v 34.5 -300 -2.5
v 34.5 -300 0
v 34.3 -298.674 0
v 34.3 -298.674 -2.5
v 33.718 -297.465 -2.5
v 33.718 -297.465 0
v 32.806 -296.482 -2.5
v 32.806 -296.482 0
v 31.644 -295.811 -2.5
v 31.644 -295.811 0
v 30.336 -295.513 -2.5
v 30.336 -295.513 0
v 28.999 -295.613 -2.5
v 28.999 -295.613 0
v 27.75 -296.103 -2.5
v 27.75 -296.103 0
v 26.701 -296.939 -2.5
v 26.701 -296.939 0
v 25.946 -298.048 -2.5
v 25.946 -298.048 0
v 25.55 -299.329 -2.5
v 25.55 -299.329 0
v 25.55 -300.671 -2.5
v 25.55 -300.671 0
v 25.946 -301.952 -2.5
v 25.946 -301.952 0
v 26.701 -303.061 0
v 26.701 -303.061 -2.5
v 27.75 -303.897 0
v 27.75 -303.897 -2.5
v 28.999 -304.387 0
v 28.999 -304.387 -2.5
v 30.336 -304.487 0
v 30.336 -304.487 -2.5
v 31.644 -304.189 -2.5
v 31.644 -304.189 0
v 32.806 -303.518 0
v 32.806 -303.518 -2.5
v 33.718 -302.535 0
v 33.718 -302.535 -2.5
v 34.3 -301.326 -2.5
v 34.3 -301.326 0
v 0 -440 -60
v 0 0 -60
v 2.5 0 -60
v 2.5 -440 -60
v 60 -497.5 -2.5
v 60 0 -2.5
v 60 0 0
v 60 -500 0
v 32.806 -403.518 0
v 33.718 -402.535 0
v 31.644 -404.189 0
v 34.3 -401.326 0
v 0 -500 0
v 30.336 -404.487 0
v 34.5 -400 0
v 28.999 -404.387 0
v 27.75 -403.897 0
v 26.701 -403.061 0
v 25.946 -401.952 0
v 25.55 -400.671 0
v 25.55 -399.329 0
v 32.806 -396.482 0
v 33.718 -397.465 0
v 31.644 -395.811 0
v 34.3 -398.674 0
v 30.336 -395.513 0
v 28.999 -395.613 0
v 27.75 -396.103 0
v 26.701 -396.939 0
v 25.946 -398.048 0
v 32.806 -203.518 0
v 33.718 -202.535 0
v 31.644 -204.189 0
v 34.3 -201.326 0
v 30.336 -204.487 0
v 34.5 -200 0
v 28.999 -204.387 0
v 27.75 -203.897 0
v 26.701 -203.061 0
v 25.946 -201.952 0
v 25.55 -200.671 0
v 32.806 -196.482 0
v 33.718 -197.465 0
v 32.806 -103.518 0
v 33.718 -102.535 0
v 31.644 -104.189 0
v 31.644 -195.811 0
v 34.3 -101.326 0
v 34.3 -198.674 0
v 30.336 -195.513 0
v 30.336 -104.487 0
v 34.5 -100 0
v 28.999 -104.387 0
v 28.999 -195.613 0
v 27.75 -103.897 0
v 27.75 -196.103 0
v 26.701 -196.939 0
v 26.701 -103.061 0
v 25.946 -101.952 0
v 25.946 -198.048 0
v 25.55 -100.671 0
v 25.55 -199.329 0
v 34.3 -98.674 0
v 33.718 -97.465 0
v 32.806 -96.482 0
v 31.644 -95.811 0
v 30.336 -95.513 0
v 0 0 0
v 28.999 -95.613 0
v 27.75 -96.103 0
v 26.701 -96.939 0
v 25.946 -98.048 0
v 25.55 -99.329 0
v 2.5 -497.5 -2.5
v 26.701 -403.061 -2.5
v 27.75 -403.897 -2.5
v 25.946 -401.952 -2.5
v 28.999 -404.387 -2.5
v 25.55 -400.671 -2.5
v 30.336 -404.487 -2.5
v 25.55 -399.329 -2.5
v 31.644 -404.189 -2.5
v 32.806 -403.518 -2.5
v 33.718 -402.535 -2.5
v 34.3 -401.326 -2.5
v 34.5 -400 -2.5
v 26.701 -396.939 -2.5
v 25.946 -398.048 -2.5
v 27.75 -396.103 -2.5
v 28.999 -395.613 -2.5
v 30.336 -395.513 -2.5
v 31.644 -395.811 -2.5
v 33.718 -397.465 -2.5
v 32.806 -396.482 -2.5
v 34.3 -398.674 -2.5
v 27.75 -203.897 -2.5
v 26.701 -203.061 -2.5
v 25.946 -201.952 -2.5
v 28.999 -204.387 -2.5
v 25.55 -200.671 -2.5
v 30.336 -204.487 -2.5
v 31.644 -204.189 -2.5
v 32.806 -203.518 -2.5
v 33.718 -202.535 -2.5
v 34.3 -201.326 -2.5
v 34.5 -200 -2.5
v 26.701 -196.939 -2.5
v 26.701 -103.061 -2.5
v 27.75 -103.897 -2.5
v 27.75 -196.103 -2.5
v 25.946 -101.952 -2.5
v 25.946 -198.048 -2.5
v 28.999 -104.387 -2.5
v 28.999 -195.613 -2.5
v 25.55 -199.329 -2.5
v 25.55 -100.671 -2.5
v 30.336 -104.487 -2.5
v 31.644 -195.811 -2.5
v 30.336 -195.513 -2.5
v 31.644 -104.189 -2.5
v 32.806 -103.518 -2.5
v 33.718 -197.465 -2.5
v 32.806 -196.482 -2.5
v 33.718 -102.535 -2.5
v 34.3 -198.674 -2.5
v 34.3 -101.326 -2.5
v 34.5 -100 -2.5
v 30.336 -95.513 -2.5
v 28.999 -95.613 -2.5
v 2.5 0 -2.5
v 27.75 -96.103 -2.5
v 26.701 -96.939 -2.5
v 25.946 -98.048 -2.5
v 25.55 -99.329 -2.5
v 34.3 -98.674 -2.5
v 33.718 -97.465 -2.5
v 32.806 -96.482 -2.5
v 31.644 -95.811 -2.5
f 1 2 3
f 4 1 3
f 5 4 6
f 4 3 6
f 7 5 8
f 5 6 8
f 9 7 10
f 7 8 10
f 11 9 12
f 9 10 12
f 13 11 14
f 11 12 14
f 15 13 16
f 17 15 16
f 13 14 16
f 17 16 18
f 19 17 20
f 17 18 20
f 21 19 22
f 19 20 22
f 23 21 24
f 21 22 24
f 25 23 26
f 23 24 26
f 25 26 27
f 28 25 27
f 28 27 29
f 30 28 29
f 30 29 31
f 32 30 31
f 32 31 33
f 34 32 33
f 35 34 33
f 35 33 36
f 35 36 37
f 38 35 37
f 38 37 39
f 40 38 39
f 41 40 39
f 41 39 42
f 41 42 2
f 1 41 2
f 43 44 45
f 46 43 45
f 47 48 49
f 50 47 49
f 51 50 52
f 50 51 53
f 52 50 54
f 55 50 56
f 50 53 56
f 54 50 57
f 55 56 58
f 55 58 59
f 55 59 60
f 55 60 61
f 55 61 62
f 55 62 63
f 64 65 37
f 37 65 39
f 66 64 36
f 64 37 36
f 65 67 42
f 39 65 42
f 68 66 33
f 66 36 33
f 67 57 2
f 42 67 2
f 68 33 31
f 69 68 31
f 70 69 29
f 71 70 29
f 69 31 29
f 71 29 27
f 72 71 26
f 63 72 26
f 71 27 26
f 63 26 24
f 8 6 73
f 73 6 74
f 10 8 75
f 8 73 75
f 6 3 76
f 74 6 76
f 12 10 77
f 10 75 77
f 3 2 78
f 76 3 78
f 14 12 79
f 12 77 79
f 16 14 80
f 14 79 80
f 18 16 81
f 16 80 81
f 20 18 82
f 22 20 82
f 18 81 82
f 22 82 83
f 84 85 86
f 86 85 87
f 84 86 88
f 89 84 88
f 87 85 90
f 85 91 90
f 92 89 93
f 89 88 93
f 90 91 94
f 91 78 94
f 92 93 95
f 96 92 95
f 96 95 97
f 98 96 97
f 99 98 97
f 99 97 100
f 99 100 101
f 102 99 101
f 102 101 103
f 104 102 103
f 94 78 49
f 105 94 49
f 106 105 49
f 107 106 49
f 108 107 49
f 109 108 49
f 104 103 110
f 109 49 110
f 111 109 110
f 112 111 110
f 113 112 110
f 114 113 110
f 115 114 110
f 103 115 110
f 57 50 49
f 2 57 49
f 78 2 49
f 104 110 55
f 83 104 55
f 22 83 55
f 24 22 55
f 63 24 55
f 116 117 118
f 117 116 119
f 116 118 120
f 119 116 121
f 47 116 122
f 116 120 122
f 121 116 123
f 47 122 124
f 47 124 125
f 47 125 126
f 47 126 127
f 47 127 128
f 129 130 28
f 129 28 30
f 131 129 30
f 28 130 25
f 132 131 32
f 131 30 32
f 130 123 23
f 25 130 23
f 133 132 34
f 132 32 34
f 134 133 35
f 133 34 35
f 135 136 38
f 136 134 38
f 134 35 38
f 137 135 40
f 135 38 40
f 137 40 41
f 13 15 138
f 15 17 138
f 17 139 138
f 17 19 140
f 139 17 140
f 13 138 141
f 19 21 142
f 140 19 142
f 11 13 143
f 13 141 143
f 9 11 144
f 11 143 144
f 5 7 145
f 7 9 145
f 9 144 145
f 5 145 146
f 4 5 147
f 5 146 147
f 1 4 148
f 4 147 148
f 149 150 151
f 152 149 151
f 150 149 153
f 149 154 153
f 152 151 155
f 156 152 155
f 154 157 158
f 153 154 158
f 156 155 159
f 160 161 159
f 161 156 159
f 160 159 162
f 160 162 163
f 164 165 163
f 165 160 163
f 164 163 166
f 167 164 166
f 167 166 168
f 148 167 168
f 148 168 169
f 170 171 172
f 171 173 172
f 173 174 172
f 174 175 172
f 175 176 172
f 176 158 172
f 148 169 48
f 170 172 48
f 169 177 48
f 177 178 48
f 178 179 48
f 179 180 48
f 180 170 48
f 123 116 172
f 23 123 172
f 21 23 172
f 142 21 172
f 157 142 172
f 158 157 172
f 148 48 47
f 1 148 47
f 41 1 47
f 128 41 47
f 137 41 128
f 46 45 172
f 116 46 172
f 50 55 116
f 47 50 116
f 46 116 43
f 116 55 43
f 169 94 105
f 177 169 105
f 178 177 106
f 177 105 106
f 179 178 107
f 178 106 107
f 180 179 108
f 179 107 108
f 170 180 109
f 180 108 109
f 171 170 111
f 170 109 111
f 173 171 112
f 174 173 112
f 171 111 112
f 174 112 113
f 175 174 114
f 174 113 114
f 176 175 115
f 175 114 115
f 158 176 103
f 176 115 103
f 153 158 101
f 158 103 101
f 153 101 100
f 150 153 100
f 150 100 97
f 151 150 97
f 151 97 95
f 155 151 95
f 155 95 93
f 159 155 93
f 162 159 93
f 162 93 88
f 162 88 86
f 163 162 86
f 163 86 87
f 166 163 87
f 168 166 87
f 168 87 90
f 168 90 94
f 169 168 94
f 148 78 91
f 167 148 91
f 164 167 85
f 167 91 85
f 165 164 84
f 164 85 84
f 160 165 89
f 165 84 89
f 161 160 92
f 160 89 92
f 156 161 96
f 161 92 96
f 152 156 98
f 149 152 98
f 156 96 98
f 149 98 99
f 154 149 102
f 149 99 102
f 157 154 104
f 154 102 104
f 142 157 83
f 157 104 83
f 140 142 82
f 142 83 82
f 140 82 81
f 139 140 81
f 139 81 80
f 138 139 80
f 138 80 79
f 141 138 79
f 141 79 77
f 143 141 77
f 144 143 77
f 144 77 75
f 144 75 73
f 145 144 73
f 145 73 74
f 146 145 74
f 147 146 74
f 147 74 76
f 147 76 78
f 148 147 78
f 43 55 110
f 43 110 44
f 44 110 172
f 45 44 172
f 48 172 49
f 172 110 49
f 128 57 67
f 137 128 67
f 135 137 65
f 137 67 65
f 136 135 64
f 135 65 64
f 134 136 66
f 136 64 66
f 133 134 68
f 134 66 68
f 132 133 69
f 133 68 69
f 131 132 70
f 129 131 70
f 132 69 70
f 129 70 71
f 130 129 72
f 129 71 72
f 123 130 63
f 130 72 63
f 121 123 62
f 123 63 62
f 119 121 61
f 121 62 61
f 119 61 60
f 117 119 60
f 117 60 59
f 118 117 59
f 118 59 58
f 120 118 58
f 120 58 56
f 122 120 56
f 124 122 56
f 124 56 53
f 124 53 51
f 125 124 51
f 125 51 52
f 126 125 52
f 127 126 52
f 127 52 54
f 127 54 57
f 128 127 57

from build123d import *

# Parameters (mm, degrees)
F1_DEPTH = 500
F3_DEPTH = 60.001
F4_R     = 4.5
F5_DEPTH = 60.001


with BuildPart() as f1:
    # F0 (on Front) → F1 (new body)
    with BuildSketch(Plane.XZ):
        Polygon((60, 0), (0, 0), (0, -60), (2.5, -60), (2.5, -2.5), (60, -2.5), align=None)
    extrude(amount=F1_DEPTH)

    # F2 (on face) → F3 (cut, through all)
    with BuildSketch(Plane(origin=(0, 0, 0), x_dir=(0, -1, 0), z_dir=(-1, 0, 0))):
        Polygon((500, -60), (500, 0), (440, -60), align=None)
    extrude(amount=-F3_DEPTH, mode=Mode.SUBTRACT)

    # F4 (on face) → F5 (cut, through all)
    with BuildSketch(Plane.XY):
        with Locations((30, -100)):
            Circle(F4_R)
        with Locations((30, -200)):
            Circle(F4_R)
        with Locations((30, -300)):
            Circle(F4_R)
        with Locations((30, -400)):
            Circle(F4_R)
    extrude(amount=-F5_DEPTH, mode=Mode.SUBTRACT)


solid = f1.part
